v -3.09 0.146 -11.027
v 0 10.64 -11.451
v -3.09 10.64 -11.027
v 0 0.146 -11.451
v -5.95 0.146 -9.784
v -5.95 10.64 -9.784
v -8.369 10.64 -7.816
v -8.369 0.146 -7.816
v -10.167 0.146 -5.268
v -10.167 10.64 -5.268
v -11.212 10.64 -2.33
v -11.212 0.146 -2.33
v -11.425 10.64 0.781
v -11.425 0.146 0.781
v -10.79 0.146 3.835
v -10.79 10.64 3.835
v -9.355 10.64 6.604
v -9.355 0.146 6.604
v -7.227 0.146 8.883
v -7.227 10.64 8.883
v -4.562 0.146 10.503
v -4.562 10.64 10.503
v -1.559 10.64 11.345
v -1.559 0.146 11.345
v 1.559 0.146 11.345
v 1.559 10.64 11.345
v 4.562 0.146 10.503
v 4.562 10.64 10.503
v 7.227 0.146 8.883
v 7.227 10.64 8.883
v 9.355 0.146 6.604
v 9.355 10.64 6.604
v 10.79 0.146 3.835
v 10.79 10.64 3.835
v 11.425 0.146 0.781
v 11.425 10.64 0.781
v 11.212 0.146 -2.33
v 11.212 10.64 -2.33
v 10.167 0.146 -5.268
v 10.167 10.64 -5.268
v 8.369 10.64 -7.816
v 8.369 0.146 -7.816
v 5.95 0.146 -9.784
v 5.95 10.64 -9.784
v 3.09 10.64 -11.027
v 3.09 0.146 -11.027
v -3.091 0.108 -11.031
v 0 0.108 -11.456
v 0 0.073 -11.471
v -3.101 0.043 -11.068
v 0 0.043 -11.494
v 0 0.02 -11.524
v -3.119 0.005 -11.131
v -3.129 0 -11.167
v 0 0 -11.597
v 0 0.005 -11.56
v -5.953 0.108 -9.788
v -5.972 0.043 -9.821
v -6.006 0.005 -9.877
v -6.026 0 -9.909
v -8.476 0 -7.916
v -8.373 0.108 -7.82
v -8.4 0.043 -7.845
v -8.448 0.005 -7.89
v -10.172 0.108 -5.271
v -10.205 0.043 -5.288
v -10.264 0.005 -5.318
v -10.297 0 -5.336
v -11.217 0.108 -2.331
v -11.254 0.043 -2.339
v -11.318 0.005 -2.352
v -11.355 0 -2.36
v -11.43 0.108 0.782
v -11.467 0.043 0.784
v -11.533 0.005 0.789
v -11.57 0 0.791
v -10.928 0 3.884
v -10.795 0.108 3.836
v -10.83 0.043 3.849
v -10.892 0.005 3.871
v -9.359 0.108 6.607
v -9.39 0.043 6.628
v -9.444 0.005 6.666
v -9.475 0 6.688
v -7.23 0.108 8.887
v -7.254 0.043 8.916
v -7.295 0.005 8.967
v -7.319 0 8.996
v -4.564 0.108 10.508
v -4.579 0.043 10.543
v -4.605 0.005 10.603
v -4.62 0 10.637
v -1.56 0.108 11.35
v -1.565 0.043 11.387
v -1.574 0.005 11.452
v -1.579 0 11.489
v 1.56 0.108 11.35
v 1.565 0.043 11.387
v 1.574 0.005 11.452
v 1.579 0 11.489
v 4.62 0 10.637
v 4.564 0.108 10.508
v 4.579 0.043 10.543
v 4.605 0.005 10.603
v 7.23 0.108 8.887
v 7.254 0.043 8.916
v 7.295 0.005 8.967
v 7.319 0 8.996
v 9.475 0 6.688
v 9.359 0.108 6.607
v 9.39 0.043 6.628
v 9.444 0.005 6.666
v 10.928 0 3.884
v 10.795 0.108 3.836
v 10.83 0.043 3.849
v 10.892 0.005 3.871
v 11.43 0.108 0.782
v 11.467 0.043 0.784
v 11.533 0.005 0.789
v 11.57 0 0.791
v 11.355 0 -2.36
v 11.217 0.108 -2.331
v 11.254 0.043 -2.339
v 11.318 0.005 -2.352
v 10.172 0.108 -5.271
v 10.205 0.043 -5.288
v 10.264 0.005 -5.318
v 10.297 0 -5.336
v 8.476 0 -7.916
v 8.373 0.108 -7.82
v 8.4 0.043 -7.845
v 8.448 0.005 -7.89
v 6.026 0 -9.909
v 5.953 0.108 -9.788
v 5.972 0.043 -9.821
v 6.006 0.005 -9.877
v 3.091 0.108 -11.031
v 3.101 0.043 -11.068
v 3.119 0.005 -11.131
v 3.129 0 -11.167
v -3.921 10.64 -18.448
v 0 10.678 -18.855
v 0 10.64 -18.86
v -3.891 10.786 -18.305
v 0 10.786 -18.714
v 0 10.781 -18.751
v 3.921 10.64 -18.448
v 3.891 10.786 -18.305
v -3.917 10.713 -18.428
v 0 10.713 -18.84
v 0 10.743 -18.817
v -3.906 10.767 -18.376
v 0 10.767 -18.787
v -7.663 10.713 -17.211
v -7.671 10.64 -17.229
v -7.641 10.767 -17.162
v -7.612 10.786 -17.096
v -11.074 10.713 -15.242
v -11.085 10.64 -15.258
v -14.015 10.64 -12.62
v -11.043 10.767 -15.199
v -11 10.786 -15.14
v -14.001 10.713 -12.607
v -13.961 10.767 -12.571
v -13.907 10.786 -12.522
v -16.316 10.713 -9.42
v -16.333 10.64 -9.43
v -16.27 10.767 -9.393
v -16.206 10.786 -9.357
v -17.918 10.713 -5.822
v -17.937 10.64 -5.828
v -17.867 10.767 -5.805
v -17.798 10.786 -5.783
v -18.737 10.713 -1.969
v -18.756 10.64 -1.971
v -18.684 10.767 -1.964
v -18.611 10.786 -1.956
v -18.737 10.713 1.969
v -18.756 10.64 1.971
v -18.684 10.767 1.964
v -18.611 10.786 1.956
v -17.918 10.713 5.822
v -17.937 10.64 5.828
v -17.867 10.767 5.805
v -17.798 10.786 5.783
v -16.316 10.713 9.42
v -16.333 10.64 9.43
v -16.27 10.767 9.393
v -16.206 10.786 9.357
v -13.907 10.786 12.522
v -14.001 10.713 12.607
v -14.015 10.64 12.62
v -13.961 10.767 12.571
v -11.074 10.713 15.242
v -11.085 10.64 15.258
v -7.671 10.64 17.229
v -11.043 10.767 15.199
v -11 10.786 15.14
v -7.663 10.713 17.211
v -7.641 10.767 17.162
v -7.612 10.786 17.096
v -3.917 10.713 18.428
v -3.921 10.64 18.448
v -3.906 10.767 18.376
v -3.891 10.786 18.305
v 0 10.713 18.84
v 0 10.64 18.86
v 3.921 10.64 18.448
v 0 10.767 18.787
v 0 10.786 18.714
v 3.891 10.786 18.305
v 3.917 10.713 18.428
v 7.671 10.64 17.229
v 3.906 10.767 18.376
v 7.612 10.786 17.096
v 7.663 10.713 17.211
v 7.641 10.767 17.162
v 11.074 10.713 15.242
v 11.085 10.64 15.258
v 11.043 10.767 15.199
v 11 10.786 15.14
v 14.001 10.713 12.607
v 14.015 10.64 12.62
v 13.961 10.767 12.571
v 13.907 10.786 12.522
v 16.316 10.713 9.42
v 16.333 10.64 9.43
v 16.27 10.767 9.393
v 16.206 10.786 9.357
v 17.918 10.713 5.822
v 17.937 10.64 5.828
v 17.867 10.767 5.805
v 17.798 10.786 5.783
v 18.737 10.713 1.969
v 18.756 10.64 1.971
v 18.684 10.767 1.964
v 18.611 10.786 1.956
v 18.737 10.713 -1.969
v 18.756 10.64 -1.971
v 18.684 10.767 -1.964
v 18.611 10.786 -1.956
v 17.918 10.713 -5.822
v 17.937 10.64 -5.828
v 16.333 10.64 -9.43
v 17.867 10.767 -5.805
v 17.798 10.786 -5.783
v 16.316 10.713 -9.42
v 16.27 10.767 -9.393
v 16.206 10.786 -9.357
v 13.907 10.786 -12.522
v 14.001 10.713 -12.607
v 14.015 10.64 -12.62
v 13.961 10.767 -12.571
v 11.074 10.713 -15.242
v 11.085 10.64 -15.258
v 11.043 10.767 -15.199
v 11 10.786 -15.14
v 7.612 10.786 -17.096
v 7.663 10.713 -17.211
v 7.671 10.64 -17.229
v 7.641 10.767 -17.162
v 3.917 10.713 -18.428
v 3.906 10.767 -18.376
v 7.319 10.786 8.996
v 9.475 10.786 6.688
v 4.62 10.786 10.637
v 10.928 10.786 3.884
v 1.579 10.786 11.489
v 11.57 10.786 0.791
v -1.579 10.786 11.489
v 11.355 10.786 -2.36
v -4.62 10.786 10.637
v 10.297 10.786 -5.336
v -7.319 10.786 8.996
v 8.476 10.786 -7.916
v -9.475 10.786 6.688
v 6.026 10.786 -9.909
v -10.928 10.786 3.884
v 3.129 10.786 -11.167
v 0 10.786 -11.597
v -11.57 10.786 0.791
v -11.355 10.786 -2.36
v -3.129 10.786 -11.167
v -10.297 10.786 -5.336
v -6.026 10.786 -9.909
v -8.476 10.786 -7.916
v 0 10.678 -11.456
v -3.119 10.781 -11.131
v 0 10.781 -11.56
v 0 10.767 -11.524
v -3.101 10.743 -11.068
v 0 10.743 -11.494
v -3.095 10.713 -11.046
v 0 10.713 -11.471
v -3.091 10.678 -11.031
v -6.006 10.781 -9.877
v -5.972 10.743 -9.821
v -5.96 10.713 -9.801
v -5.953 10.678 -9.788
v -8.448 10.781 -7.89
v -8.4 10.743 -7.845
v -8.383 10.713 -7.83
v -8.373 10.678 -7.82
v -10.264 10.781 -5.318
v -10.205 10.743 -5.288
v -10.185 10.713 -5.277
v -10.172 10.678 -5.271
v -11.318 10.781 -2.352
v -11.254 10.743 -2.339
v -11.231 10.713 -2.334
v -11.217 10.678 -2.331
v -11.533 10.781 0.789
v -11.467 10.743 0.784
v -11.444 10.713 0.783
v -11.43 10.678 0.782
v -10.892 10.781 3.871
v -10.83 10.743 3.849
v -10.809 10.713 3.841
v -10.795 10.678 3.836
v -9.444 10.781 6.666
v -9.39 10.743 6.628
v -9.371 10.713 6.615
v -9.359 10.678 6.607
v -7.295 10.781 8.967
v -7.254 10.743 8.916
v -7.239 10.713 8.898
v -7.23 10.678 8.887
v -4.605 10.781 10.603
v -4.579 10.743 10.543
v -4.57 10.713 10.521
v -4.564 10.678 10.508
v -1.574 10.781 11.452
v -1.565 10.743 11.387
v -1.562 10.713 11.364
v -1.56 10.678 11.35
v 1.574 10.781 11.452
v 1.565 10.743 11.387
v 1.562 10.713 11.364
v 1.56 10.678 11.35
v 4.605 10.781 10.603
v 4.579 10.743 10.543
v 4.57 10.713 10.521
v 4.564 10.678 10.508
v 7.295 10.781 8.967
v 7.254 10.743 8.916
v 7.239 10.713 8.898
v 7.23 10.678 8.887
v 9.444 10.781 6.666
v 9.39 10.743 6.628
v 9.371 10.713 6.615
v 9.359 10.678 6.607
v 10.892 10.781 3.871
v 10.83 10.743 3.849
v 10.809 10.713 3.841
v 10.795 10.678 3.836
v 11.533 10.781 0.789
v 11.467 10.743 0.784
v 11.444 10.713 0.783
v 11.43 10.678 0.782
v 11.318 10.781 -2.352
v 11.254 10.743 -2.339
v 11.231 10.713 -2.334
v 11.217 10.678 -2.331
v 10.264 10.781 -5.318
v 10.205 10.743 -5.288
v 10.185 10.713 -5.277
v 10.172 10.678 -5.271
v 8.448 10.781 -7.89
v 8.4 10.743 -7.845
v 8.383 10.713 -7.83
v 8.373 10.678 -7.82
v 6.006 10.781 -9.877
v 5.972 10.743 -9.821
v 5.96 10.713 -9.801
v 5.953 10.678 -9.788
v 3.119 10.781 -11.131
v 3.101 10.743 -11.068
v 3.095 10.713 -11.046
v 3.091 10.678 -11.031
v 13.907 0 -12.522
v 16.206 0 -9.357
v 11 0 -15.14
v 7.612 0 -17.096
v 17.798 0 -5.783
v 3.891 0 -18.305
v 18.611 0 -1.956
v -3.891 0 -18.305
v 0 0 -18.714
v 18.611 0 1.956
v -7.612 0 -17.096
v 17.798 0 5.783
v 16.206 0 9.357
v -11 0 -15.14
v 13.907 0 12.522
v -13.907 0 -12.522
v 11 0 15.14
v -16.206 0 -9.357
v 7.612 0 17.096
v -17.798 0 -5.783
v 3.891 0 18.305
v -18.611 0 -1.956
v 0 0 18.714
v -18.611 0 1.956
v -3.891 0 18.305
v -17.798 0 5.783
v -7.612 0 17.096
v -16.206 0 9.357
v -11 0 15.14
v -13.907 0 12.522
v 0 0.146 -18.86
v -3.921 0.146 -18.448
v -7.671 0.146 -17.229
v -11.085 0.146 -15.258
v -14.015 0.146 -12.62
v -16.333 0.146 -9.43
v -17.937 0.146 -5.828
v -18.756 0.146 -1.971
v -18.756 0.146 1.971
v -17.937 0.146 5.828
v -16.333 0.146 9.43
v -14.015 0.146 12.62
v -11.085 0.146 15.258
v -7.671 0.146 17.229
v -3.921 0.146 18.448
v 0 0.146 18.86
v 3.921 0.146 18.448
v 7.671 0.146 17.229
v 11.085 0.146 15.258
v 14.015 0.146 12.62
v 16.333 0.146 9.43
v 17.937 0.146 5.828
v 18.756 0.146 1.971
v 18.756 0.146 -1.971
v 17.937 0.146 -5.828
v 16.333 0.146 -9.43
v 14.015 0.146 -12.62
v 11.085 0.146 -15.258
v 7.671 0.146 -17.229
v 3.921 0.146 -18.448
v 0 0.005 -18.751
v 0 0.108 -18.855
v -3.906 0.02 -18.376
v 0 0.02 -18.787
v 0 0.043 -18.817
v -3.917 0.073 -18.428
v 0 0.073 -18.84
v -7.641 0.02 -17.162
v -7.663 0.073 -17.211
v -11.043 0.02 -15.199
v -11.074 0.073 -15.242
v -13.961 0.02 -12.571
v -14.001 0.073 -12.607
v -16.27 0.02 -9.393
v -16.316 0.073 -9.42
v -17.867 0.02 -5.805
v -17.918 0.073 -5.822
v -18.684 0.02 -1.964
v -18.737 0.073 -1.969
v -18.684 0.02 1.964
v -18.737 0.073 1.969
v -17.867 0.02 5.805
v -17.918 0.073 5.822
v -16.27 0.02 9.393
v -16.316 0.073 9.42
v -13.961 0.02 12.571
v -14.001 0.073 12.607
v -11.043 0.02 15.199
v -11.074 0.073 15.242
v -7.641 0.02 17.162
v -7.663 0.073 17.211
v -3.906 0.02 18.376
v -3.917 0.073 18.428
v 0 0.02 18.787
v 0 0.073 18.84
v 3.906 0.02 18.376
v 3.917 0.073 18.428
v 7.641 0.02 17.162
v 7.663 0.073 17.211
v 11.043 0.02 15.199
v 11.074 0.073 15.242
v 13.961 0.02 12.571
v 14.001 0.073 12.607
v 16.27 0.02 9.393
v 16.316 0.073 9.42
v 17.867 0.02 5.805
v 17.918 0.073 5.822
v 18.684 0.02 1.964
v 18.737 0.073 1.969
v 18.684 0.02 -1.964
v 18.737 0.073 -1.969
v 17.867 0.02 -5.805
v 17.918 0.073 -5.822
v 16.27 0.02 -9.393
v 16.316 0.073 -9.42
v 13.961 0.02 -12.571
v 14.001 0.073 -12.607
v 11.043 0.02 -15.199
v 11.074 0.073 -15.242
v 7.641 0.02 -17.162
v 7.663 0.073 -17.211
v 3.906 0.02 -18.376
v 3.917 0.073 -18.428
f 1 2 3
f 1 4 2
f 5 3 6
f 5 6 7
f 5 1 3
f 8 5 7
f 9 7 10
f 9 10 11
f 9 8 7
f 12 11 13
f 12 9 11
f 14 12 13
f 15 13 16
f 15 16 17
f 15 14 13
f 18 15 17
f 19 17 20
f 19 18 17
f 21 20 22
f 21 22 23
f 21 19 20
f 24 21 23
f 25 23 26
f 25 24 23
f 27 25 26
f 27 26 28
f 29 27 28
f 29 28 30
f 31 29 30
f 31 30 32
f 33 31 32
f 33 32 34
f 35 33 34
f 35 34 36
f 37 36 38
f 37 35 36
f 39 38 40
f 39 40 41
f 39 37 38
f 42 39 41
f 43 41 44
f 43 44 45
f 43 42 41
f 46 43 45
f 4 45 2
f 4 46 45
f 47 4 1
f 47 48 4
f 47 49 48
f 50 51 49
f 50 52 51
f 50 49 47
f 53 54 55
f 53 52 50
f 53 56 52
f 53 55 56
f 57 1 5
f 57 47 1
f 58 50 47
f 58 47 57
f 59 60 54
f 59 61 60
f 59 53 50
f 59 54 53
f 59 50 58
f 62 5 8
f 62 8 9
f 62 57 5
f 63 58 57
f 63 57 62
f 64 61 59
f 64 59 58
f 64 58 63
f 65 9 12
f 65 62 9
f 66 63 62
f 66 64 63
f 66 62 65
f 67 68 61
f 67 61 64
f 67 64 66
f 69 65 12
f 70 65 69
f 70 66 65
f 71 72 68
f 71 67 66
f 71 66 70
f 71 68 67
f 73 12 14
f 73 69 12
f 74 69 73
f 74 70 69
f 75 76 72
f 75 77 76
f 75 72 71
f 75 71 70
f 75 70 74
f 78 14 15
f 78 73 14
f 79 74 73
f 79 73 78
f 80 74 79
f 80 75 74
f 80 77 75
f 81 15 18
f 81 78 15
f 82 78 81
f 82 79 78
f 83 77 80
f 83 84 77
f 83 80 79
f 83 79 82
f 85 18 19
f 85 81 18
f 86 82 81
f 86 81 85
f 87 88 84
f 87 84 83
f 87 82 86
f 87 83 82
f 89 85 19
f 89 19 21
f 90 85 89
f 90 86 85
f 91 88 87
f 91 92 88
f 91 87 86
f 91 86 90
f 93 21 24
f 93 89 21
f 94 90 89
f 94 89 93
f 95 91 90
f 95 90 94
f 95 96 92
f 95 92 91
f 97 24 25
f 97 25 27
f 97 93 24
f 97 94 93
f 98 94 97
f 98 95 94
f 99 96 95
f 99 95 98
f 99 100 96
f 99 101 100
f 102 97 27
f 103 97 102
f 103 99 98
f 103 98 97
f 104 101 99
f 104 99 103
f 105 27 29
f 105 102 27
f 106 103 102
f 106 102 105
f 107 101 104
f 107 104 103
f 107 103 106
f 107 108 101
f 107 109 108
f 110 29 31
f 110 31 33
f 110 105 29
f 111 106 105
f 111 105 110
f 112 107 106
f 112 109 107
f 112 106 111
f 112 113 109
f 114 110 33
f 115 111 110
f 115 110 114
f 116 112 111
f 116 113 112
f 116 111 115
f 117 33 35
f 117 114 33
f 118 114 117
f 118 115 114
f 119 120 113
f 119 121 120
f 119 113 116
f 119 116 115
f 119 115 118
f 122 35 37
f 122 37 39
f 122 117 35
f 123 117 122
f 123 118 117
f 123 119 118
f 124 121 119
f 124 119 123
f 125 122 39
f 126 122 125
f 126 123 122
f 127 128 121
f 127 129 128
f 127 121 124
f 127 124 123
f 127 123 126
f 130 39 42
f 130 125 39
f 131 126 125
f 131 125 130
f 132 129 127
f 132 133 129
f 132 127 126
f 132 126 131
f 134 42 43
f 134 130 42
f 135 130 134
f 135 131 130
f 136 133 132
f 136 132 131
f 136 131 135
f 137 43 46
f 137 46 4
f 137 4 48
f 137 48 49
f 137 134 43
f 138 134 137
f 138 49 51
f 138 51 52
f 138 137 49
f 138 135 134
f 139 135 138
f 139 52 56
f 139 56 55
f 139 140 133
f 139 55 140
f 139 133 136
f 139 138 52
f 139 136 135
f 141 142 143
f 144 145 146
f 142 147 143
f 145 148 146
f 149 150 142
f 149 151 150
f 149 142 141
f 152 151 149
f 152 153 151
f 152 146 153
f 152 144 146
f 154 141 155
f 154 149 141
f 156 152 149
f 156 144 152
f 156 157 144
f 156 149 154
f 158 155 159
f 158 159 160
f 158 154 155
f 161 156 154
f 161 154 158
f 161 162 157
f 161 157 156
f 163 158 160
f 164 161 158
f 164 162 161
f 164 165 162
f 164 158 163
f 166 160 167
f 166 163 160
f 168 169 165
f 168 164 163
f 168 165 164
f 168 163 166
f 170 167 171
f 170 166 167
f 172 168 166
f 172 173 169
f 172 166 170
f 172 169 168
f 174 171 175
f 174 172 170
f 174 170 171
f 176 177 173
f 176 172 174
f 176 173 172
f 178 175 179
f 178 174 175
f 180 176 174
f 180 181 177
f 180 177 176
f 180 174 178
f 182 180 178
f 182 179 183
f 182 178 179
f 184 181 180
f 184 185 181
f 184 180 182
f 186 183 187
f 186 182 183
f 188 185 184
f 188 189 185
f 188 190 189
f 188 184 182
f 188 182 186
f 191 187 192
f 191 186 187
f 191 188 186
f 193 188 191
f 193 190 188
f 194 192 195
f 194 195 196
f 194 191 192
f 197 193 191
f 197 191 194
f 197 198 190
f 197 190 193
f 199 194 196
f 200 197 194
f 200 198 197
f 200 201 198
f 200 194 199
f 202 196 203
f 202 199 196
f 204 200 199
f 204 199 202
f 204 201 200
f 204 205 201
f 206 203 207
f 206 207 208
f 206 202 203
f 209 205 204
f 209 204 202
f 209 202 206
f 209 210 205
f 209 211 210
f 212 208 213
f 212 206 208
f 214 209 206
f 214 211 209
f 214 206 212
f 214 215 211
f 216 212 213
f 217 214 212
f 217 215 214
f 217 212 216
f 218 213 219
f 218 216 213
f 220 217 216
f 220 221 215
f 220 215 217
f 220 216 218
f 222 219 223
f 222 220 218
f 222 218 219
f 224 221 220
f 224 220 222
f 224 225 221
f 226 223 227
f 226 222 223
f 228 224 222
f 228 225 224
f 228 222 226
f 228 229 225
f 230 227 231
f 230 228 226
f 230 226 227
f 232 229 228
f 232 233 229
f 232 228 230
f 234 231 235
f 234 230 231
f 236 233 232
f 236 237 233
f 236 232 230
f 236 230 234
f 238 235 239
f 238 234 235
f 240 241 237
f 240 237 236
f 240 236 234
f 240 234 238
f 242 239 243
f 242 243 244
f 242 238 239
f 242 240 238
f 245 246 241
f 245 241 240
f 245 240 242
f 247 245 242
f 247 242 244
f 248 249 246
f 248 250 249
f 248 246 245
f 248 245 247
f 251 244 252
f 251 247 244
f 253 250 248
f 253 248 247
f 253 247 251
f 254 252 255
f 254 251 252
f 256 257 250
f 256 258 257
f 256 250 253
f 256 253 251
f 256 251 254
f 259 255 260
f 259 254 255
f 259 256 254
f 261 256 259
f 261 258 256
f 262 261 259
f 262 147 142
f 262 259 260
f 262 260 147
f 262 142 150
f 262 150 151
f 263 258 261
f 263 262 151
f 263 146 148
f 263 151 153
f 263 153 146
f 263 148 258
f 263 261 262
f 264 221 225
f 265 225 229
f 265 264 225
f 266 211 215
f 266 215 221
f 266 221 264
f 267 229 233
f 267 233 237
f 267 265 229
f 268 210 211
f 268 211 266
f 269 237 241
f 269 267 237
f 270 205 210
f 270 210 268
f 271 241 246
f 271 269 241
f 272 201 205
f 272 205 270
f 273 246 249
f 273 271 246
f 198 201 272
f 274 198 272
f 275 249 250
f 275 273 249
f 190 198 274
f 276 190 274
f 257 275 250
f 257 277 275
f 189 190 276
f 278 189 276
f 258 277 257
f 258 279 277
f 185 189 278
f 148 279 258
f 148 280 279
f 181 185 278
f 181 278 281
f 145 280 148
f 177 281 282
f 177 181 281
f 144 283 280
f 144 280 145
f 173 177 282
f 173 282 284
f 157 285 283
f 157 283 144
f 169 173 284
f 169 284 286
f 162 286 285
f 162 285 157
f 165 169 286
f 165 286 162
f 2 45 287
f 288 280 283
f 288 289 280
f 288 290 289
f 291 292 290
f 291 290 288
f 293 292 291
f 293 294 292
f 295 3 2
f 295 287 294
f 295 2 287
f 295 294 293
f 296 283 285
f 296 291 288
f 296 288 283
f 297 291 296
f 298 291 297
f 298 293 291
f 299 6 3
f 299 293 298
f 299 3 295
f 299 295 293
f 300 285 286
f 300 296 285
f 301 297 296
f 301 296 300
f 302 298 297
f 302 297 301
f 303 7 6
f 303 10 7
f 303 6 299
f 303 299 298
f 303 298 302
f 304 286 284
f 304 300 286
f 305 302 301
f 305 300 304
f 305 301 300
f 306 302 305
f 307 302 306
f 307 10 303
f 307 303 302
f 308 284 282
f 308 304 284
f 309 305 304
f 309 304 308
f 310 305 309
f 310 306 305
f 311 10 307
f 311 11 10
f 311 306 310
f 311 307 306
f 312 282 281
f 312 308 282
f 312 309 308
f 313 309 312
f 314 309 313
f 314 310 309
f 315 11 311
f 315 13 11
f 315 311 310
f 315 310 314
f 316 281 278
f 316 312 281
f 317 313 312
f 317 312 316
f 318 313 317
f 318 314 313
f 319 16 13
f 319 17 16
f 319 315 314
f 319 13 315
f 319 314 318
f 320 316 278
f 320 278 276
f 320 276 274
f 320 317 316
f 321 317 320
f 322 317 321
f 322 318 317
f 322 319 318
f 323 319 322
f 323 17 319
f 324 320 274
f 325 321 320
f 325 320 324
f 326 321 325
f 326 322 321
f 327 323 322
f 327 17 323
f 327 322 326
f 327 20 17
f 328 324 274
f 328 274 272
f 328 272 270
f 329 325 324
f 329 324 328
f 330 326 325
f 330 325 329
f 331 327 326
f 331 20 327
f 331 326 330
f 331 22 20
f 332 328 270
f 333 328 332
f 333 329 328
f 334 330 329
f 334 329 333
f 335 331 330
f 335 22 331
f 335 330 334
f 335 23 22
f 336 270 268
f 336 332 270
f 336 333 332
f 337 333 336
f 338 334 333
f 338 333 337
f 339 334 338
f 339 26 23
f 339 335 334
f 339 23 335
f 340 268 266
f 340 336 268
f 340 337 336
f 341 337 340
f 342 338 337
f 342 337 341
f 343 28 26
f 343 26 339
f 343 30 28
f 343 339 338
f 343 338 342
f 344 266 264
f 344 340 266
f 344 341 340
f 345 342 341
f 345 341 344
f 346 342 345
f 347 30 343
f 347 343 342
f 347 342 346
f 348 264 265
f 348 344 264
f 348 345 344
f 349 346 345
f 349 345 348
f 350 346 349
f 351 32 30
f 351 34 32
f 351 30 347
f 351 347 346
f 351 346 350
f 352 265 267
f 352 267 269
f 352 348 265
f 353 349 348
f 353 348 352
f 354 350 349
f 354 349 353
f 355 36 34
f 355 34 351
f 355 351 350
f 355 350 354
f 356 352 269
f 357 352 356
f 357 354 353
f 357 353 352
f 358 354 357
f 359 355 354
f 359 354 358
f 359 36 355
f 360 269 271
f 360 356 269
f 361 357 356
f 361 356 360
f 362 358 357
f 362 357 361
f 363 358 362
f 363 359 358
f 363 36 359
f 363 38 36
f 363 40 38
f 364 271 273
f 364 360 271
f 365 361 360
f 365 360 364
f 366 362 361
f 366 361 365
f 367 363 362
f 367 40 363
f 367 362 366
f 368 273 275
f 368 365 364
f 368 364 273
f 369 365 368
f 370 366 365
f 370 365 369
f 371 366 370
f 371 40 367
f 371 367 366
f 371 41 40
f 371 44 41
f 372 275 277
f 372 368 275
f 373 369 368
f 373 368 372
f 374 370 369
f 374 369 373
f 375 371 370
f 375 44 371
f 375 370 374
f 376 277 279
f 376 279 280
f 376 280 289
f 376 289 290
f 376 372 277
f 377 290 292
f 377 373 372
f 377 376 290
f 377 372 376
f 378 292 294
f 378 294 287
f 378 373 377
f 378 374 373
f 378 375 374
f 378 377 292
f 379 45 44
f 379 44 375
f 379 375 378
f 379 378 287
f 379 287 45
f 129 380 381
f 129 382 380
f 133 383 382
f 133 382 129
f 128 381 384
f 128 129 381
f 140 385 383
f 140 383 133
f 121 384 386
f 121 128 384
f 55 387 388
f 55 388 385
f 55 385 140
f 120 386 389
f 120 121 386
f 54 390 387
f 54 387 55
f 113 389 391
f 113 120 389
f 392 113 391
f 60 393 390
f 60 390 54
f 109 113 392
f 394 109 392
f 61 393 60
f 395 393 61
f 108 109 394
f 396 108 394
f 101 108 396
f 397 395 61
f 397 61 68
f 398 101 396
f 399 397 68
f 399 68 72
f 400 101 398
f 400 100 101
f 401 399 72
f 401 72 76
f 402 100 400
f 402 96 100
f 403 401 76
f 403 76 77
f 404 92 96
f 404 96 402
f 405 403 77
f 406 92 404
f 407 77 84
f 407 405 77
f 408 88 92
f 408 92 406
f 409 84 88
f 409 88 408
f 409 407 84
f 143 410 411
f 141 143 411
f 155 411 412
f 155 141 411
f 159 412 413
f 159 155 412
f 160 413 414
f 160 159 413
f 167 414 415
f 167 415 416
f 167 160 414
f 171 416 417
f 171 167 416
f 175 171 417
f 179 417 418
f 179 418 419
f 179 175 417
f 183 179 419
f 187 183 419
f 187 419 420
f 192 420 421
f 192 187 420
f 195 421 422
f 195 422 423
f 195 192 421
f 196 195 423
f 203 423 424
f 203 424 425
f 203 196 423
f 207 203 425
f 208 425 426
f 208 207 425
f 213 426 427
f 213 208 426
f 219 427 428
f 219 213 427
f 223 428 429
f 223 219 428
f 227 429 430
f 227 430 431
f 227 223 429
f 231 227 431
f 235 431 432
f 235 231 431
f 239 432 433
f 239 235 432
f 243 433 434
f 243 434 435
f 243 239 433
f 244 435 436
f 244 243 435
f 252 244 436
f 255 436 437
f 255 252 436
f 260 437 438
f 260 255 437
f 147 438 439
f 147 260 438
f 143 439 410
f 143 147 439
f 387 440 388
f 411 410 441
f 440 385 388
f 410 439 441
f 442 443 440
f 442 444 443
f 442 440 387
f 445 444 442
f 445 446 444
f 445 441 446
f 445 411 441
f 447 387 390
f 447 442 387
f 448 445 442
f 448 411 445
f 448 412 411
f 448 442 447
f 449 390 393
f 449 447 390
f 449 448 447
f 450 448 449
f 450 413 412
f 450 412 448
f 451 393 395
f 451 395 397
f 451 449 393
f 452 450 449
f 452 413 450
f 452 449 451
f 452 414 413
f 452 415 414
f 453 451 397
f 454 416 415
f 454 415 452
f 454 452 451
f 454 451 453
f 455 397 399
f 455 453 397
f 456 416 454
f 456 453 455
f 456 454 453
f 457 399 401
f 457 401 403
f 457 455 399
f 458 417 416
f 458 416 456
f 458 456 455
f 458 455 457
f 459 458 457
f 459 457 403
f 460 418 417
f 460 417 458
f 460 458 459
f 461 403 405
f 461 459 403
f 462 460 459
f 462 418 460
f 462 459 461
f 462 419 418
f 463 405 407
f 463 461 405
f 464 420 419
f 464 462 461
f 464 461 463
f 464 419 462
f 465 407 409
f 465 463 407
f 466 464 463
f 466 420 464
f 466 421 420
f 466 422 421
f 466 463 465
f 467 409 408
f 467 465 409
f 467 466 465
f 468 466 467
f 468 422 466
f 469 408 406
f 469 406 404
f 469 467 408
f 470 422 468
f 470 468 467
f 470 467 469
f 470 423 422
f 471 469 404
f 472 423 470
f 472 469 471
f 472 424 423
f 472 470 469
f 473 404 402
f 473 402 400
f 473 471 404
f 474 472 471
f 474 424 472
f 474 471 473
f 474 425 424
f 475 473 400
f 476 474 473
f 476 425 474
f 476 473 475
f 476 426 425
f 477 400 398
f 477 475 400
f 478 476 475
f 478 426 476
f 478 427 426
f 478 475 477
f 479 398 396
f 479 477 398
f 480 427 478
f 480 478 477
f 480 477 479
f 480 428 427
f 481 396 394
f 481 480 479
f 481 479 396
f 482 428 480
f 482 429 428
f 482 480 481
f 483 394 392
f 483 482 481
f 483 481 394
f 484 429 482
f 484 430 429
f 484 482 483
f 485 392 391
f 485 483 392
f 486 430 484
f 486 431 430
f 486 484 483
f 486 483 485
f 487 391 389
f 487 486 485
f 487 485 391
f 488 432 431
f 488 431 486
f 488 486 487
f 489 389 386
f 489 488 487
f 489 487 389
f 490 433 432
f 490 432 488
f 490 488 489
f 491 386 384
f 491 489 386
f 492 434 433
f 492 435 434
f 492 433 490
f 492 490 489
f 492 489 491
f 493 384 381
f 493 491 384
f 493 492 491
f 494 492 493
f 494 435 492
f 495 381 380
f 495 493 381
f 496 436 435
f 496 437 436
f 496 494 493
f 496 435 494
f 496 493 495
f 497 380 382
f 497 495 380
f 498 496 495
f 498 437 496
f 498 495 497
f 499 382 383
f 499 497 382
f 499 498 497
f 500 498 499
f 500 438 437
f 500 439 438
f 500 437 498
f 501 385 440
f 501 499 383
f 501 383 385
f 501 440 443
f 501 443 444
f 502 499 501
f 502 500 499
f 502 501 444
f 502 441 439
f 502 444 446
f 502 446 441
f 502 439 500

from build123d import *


with BuildPart() as part:
    # Toroidal Core → Revolve2 (revolve)
    with BuildSketch(Plane.XY, mode=Mode.PRIVATE) as revolve2_sk:
        with BuildLine():
            Line((11.59739394, 0), (18.713632535, 0))
            ThreePointArc((18.713632535, 0), (18.816911461, 0.042779532), (18.859690994, 0.146058459))
            Line((18.859690994, 0.146058459), (18.859690994, 10.640147279))
            ThreePointArc((18.859690994, 10.640147279), (18.816911461, 10.743426205), (18.713632535, 10.786205737))
            Line((18.713632535, 10.786205737), (11.59739394, 10.786205737))
            ThreePointArc((11.59739394, 10.786205737), (11.494115013, 10.743426205), (11.451335481, 10.640147279))
            Line((11.451335481, 10.640147279), (11.451335481, 0.146058459))
            ThreePointArc((11.451335481, 0.146058459), (11.494115013, 0.042779532), (11.59739394, 0))
        make_face()
    revolve(revolve2_sk.sketch.rotate(Axis((0, -8.107972275, 0), (0, 1, 0)), 90), axis=Axis((0, -8.107972275, 0), (0, 1, 0)))


solid = part.part
